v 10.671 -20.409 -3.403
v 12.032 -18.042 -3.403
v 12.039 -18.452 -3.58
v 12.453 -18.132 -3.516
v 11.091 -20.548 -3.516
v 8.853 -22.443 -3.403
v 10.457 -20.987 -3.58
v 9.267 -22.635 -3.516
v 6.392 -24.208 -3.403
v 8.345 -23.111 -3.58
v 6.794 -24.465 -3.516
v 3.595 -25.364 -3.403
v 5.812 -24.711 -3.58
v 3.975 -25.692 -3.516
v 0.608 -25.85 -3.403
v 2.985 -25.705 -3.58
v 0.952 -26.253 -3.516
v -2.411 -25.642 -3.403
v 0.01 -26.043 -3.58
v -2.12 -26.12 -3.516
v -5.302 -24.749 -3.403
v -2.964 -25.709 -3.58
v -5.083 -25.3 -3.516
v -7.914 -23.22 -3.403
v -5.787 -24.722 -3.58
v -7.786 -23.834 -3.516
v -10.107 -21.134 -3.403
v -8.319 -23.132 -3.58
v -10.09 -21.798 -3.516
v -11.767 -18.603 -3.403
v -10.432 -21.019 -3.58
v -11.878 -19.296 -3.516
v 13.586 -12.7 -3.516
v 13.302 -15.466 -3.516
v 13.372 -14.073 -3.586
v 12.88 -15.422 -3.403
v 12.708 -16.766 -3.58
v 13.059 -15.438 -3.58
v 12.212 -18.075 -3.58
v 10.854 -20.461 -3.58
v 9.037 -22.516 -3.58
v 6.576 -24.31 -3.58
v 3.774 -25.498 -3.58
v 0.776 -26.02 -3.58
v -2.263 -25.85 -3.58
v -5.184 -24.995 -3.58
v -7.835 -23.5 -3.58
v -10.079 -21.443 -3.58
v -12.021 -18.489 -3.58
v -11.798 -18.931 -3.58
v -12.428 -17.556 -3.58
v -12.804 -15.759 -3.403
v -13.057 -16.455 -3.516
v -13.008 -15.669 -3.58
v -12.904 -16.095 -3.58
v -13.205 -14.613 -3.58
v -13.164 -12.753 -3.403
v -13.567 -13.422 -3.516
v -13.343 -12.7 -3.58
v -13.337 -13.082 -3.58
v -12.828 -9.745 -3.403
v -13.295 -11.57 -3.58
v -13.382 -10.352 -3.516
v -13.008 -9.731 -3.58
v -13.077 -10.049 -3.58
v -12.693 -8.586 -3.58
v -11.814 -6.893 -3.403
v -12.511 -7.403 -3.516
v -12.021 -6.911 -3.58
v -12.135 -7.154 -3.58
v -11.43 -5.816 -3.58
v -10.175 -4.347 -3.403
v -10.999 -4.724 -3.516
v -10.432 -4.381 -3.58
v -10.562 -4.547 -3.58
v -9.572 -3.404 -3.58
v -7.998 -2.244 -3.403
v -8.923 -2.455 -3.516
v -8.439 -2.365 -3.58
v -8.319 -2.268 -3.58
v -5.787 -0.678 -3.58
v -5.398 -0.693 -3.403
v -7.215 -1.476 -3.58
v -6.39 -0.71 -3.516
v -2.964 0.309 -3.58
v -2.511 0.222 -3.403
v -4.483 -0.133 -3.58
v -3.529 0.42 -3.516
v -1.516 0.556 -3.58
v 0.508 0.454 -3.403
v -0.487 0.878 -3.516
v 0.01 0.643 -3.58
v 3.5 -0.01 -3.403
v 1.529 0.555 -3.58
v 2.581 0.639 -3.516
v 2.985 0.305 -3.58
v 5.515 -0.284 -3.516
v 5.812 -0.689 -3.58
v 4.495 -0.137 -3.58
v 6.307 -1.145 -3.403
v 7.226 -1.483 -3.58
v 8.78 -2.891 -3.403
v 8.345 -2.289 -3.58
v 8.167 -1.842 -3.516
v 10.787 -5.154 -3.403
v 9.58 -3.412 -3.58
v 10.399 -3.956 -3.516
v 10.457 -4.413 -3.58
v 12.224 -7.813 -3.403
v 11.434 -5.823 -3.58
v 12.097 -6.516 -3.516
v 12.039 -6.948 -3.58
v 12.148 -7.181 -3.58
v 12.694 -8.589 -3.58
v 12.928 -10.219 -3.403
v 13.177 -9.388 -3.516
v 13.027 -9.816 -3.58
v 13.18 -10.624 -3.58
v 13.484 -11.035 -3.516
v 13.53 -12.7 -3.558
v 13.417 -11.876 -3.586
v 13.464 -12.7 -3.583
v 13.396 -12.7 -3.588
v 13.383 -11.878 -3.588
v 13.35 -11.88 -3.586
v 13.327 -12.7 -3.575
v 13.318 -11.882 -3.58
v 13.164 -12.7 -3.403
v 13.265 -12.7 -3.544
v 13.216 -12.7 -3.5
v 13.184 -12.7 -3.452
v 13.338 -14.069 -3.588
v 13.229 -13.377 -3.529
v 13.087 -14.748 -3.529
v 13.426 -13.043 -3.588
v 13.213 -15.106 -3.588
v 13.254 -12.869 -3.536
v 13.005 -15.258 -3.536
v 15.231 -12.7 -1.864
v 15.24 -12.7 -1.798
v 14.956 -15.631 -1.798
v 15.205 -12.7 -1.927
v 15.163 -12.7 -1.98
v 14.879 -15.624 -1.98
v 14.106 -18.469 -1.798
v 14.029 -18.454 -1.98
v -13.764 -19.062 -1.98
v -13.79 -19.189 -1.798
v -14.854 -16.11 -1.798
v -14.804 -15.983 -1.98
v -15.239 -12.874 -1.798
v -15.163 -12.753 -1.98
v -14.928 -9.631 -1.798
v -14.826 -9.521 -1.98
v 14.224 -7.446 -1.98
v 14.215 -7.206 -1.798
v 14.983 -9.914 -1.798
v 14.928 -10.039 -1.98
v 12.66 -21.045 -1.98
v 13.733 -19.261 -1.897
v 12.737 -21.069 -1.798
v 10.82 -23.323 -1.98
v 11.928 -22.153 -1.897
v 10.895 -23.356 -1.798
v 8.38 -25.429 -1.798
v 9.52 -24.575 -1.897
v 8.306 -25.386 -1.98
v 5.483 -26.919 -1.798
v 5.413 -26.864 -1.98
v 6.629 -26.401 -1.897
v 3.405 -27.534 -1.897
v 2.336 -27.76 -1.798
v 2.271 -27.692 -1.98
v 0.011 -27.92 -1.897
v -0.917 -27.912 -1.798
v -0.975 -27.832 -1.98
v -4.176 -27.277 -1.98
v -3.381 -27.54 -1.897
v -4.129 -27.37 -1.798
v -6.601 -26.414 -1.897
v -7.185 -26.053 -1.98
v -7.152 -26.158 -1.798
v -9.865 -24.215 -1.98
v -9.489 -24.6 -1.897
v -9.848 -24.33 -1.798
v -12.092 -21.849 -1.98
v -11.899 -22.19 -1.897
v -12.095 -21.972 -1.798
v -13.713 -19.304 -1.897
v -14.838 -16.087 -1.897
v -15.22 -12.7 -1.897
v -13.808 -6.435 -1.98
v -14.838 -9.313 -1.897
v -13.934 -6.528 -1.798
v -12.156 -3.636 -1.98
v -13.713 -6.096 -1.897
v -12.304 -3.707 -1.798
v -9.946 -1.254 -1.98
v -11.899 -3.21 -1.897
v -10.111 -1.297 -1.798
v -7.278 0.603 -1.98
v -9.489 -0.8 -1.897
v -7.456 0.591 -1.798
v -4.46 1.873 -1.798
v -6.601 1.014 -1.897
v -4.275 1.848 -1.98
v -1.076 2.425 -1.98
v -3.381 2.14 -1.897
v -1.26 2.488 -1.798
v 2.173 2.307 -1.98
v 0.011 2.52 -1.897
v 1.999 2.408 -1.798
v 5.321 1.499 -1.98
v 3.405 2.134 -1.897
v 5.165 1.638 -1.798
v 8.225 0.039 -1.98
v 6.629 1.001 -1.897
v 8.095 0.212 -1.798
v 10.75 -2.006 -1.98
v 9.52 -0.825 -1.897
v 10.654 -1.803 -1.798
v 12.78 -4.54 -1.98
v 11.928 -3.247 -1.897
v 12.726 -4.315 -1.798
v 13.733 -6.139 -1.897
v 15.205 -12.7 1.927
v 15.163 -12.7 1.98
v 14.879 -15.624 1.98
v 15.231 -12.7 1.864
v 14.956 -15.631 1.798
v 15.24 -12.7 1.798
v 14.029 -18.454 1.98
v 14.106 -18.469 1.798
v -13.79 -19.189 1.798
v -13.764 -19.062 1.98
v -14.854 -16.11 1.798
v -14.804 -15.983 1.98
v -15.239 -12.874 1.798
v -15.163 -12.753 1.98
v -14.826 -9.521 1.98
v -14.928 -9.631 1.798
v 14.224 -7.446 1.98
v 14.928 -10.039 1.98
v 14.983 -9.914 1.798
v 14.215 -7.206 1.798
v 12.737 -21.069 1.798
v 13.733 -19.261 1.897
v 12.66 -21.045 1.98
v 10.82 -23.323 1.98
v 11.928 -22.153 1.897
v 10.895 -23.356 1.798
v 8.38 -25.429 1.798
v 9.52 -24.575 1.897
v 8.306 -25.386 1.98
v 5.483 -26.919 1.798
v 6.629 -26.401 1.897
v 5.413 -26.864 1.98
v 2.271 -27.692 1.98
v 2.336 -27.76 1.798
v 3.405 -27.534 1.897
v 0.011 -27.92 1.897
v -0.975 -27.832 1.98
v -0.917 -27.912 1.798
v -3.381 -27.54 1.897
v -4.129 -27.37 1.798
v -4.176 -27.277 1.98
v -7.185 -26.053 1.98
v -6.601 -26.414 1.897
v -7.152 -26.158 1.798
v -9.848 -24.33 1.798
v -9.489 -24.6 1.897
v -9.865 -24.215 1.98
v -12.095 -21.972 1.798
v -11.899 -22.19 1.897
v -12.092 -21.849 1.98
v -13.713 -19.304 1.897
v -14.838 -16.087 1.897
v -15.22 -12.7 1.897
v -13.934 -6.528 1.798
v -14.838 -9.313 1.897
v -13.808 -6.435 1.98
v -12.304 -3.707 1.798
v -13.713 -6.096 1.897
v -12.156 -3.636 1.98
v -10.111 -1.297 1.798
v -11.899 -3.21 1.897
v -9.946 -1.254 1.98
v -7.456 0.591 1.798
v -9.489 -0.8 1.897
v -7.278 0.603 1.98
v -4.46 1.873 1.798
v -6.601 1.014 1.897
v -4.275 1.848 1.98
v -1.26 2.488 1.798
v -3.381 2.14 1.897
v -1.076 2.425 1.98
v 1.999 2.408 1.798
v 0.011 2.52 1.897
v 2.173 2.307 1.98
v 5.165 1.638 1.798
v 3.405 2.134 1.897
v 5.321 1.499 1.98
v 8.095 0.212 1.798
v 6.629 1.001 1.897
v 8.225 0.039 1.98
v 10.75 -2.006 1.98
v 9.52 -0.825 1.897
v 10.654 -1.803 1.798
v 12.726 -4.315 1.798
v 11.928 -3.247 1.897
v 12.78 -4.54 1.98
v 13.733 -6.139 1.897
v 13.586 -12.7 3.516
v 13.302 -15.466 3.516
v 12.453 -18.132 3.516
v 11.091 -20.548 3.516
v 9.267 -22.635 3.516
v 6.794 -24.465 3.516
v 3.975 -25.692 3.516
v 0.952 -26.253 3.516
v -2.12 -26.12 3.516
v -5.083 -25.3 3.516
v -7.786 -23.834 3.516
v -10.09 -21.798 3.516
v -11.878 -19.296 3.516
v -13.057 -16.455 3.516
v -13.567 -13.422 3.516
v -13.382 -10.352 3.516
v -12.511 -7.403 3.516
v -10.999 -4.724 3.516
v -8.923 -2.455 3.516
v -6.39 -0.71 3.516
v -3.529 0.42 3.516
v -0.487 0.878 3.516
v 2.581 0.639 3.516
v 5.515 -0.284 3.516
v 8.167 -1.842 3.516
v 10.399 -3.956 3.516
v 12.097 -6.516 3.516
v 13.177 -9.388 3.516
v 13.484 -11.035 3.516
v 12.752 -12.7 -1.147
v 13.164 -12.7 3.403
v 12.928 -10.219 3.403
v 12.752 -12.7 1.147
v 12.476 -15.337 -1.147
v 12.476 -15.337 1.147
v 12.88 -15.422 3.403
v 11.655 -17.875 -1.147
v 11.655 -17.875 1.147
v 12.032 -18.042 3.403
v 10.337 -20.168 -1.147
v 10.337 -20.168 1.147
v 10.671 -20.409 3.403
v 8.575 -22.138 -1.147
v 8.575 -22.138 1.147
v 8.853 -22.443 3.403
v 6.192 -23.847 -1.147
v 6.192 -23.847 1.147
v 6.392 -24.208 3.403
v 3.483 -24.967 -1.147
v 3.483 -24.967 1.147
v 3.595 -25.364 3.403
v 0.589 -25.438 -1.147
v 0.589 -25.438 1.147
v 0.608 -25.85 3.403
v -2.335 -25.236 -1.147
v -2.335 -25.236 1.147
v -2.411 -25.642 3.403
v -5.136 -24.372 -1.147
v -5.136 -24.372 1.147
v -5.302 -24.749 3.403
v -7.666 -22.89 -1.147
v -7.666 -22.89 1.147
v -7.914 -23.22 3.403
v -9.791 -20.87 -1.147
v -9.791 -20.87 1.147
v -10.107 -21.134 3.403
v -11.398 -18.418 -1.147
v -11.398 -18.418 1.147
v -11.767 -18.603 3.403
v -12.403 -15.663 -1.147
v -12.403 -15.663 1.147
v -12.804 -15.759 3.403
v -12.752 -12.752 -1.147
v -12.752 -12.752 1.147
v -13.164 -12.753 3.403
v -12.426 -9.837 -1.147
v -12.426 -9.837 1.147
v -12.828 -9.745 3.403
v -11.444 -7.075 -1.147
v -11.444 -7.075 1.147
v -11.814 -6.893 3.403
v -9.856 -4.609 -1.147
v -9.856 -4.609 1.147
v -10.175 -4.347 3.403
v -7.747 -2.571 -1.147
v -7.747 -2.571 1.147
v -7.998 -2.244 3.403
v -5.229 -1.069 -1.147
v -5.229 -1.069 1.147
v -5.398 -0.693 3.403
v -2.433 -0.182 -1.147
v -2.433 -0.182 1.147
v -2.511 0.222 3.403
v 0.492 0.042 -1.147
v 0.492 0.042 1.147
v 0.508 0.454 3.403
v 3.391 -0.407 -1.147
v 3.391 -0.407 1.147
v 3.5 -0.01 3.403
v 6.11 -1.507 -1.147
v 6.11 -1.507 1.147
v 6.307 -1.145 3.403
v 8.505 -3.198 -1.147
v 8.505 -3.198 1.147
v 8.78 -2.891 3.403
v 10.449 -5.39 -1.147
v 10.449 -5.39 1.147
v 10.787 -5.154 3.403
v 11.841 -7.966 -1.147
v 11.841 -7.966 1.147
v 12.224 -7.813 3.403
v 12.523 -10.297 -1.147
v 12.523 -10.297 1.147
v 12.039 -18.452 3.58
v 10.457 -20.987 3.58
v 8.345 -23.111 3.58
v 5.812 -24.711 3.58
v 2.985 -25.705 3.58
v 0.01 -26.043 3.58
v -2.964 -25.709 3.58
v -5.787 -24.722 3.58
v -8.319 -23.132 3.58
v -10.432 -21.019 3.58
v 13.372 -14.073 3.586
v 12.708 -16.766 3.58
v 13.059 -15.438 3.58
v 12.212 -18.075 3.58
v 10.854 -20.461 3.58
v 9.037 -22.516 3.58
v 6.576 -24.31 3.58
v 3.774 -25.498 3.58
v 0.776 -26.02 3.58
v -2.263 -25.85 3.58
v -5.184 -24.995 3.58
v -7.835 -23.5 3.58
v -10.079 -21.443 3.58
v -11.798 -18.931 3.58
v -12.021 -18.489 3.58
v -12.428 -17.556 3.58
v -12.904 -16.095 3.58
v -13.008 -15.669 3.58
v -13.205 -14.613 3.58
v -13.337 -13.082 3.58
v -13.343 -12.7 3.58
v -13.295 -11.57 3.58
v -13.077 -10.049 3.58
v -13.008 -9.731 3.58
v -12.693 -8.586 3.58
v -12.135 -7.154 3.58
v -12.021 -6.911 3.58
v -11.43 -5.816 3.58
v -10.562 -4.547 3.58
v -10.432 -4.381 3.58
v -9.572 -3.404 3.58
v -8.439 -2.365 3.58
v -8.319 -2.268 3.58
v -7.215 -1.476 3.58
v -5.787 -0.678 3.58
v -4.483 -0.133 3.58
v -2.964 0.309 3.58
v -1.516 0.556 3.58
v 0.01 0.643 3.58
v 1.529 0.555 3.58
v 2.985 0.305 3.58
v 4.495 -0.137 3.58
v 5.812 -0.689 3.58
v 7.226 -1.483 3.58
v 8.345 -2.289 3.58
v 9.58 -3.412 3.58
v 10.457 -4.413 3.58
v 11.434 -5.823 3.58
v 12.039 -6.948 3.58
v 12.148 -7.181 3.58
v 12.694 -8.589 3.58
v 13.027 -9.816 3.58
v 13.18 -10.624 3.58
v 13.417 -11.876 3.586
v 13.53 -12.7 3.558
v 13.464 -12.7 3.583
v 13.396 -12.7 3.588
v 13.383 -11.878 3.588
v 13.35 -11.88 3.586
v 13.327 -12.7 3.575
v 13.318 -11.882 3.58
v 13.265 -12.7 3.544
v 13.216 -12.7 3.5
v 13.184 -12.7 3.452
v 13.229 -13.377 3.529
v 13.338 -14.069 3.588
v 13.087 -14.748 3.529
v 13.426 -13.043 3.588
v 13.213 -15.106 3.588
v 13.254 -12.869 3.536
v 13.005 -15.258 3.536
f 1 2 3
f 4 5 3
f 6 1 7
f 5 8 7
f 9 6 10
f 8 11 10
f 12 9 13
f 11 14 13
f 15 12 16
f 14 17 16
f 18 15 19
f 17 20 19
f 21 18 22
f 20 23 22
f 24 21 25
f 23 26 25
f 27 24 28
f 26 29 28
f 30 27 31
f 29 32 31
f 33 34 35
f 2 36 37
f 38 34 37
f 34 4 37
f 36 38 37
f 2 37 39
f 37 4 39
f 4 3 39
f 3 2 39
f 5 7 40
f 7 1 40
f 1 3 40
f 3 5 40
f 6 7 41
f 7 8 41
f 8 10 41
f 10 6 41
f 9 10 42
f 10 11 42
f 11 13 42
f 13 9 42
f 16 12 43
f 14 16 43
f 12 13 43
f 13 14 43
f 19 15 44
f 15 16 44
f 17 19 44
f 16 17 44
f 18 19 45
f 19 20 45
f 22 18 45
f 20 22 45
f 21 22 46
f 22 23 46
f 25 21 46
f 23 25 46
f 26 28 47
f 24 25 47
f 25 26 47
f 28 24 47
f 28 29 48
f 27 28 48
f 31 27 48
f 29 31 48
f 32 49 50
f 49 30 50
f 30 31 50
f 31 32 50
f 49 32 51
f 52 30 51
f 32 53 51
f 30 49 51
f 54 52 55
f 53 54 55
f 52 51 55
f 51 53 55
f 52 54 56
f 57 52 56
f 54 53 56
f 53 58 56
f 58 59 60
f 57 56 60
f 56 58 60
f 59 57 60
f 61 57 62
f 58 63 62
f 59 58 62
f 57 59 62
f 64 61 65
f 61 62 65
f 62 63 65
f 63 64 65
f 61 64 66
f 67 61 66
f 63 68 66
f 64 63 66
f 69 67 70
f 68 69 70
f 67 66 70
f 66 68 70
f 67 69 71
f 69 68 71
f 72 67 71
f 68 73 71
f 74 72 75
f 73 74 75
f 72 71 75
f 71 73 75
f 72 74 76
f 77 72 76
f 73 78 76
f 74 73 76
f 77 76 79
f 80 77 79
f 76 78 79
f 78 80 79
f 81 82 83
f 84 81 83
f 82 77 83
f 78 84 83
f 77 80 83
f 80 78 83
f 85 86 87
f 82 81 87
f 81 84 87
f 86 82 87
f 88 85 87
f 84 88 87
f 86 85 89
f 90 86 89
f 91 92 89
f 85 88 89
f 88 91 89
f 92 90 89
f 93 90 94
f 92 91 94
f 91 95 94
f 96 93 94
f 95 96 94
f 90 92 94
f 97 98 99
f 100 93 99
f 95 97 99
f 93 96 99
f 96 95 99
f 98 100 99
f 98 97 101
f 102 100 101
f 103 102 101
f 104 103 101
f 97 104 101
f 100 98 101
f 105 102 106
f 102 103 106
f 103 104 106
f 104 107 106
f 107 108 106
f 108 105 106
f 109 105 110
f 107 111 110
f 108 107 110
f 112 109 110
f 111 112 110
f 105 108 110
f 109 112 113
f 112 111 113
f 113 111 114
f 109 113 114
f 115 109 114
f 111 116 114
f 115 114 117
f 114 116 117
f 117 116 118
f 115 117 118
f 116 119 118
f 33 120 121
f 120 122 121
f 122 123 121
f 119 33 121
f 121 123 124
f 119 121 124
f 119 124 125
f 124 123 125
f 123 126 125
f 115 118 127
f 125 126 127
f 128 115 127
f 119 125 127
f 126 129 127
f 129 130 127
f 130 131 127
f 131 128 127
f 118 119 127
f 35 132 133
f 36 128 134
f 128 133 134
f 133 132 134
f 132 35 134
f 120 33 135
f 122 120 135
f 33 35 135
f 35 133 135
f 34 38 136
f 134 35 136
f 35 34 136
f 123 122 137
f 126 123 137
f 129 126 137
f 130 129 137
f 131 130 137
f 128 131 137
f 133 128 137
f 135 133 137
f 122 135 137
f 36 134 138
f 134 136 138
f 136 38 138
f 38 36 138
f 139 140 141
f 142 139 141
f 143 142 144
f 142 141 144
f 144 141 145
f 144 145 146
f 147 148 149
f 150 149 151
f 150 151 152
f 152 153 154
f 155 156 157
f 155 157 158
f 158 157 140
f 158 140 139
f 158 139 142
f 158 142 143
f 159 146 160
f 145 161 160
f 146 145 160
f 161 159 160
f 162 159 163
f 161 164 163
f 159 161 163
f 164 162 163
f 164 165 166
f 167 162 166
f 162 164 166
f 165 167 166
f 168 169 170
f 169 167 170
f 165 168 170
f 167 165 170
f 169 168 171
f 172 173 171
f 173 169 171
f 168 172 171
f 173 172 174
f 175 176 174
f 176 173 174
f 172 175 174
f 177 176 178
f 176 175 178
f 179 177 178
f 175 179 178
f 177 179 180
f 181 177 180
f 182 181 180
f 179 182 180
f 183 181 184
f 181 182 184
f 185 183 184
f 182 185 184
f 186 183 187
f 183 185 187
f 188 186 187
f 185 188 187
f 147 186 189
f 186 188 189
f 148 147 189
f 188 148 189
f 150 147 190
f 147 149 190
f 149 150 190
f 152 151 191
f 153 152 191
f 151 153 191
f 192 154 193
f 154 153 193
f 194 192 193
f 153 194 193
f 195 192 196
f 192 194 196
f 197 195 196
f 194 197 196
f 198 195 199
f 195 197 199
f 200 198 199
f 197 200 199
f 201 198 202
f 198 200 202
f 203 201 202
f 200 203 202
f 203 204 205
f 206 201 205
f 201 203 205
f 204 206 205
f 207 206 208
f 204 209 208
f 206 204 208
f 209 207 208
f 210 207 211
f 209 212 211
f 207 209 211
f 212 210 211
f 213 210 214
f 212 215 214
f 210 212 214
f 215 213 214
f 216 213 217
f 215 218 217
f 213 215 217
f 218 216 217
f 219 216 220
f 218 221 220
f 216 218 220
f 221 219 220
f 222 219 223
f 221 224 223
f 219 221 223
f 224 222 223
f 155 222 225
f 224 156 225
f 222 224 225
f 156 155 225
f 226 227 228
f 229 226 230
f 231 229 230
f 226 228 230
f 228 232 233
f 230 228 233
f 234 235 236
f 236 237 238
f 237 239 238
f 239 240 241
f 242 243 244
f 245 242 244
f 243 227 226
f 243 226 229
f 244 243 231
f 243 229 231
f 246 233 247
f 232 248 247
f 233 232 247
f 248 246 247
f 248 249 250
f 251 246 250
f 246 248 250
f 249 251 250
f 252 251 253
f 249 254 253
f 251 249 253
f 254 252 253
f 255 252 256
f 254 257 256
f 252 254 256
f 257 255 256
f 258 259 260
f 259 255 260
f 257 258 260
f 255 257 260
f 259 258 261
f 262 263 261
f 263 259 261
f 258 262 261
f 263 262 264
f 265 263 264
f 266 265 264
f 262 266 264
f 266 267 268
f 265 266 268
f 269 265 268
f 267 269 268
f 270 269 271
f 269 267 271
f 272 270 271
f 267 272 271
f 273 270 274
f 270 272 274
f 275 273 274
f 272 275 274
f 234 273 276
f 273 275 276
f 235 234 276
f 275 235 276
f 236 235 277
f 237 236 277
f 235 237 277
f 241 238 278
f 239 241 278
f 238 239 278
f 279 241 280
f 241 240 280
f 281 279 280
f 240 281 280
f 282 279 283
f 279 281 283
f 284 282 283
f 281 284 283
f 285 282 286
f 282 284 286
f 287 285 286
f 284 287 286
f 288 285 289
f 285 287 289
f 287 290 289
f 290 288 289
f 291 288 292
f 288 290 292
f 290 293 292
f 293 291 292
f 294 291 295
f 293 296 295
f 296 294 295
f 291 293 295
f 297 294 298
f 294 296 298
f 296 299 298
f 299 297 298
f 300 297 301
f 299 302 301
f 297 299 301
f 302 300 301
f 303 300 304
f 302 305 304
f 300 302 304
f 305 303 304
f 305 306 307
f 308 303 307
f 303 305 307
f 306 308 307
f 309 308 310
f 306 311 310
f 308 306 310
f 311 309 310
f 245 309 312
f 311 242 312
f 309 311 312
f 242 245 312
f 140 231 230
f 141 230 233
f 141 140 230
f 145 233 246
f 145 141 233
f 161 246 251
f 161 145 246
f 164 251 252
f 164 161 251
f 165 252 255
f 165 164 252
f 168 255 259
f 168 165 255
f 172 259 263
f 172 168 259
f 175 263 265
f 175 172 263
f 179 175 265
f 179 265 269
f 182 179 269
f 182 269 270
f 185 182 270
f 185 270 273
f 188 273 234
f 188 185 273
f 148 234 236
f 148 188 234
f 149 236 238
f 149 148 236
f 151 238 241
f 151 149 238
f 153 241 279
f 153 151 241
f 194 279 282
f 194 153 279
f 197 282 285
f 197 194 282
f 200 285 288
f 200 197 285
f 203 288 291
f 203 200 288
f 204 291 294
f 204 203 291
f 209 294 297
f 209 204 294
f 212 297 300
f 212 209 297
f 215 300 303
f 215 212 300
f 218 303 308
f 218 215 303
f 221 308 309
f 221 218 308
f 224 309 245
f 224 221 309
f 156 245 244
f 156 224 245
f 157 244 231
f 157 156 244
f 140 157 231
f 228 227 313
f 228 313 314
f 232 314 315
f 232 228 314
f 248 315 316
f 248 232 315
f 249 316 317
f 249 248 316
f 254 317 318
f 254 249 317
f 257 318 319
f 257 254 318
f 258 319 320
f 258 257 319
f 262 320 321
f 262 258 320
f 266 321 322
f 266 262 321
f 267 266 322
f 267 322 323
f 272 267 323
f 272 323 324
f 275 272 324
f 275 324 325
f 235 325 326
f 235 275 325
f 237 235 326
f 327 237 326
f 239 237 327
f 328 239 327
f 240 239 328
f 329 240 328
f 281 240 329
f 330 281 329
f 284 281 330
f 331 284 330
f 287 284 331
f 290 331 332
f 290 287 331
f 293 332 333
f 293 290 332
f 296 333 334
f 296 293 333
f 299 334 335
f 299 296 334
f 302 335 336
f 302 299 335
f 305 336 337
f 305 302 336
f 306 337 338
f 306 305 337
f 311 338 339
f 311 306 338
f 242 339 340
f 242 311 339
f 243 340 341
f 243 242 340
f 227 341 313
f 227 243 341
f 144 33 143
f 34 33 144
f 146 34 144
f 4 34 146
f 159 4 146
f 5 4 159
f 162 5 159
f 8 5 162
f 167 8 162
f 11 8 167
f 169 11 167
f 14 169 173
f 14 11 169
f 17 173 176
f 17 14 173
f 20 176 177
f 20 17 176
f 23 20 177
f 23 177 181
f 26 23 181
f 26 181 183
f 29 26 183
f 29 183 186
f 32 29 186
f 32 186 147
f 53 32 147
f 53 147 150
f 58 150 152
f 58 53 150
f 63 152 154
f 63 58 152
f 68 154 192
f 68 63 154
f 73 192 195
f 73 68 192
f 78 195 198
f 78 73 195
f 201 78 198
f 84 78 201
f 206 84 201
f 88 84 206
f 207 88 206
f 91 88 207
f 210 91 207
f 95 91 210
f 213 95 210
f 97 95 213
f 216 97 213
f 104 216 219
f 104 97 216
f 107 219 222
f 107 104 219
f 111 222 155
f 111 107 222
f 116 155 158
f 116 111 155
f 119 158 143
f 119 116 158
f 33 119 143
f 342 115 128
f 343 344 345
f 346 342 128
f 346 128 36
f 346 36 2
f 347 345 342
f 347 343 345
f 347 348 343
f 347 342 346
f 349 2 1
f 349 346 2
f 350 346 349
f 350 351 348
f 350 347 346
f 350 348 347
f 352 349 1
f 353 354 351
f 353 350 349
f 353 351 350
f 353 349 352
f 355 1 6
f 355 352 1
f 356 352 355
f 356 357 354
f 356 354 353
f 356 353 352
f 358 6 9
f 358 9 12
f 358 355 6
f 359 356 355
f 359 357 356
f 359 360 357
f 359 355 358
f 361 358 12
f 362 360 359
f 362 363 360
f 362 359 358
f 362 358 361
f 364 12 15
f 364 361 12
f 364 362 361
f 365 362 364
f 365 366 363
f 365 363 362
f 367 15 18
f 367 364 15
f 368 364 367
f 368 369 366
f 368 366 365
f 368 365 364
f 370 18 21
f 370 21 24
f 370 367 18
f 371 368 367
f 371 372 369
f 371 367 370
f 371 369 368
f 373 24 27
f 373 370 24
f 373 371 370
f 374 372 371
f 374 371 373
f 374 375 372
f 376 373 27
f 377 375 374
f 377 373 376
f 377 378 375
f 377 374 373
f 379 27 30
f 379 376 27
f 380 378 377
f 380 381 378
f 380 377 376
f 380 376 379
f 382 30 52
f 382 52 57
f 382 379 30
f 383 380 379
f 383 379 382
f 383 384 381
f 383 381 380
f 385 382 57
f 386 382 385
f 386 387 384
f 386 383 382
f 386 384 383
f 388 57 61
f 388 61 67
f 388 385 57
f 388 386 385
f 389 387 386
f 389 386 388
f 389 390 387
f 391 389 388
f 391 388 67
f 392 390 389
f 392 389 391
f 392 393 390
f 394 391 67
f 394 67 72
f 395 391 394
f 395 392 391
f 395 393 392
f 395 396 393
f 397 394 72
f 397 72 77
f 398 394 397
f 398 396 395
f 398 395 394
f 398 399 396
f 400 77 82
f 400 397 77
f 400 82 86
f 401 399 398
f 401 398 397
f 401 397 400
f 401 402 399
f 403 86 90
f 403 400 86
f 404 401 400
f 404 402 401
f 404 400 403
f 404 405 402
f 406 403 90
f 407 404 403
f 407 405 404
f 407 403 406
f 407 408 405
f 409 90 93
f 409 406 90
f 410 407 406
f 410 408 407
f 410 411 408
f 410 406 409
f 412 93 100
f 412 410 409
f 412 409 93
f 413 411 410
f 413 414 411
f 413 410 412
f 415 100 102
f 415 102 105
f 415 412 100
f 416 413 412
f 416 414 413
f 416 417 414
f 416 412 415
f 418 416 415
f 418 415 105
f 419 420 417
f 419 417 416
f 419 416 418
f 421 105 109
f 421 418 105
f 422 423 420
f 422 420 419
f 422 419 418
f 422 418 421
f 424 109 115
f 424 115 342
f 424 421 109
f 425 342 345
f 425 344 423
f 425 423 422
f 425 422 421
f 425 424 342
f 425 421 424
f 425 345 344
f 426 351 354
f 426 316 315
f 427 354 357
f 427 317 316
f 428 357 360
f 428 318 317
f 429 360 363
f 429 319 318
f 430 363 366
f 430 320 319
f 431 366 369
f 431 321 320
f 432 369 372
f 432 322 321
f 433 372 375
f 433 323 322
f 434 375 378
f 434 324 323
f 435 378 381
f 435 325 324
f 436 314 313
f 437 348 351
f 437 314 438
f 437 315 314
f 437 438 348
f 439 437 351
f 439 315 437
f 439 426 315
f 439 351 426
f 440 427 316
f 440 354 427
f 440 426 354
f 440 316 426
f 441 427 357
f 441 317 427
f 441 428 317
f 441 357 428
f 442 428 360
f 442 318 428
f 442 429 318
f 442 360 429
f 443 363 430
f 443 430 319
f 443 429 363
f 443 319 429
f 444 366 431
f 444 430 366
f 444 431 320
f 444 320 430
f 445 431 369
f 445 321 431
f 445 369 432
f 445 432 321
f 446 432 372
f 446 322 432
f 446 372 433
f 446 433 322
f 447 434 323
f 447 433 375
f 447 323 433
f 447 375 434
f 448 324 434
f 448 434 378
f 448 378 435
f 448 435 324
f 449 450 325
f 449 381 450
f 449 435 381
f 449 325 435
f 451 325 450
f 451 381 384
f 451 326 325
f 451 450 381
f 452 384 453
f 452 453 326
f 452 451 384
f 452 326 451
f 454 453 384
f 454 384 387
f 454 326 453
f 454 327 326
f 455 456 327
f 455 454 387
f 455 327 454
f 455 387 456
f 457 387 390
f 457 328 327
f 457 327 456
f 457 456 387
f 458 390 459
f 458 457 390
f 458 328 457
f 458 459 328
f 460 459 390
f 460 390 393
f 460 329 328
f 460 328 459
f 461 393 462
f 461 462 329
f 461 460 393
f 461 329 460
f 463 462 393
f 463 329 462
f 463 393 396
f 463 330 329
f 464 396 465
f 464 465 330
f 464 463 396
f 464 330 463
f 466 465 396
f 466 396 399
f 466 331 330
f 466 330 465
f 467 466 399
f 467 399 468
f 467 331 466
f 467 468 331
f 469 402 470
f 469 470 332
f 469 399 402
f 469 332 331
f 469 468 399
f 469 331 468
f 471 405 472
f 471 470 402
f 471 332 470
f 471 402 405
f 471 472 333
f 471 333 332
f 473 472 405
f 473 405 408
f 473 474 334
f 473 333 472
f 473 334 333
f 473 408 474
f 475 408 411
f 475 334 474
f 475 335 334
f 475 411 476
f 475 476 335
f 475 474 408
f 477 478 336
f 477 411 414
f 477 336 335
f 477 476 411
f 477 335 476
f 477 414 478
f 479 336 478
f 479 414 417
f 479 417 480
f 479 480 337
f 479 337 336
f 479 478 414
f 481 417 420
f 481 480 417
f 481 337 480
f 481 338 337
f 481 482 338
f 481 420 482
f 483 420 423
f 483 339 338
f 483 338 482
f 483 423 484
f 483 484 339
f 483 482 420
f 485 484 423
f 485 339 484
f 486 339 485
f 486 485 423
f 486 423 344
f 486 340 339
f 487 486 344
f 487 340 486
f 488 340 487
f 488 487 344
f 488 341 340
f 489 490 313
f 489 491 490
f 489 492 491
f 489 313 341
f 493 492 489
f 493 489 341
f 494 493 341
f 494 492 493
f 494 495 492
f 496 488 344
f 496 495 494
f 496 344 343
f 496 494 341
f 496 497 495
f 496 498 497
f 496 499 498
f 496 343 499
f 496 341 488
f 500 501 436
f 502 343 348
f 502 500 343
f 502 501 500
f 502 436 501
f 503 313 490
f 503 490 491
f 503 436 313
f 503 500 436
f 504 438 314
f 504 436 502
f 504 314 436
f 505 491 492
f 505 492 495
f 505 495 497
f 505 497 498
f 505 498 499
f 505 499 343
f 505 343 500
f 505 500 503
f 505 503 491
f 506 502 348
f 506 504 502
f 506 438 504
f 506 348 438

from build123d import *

# Parameters (mm, degrees)
FILLET1_R = 0.254
FILLET2_R = 0.254


with BuildPart() as part:
    # Sketch1 → Revolve1 (revolve)
    with BuildSketch(Plane(origin=(0, 0, 0), x_dir=(0, 0, -1), z_dir=(1, 0, 0)), mode=Mode.PRIVATE) as revolve1_sk:
        with BuildLine():
            Line((-3.81, 0.584972142), (-1.905, 2.54))
            Line((-1.905, 2.54), (1.905, 2.54))
            Line((1.905, 2.54), (3.81, 0.584972142))
            ThreePointArc((3.81, 0.584972142), (0, 0), (-3.81, 0.584972142))
        make_face()
    revolve(revolve1_sk.sketch.rotate(Axis((0, -12.7, 24.898515868), (0, 0, -1)), 90), axis=Axis((0, -12.7, 24.898515868), (0, 0, -1)))

    # Fillet1
    fillet1_edges = [part.edges().sort_by_distance(p)[0] for p in [
        (-13.284972142, -12.7, 3.81),
        (-13.284972142, -12.7, -3.81),
    ]]
    fillet(fillet1_edges, radius=FILLET1_R)

    # Fillet2
    fillet2_edges = [part.edges().sort_by_distance(p)[0] for p in [
        (-15.24, -12.7, 1.905),
        (-15.24, -12.7, -1.905),
    ]]
    fillet(fillet2_edges, radius=FILLET2_R)


solid = part.part
